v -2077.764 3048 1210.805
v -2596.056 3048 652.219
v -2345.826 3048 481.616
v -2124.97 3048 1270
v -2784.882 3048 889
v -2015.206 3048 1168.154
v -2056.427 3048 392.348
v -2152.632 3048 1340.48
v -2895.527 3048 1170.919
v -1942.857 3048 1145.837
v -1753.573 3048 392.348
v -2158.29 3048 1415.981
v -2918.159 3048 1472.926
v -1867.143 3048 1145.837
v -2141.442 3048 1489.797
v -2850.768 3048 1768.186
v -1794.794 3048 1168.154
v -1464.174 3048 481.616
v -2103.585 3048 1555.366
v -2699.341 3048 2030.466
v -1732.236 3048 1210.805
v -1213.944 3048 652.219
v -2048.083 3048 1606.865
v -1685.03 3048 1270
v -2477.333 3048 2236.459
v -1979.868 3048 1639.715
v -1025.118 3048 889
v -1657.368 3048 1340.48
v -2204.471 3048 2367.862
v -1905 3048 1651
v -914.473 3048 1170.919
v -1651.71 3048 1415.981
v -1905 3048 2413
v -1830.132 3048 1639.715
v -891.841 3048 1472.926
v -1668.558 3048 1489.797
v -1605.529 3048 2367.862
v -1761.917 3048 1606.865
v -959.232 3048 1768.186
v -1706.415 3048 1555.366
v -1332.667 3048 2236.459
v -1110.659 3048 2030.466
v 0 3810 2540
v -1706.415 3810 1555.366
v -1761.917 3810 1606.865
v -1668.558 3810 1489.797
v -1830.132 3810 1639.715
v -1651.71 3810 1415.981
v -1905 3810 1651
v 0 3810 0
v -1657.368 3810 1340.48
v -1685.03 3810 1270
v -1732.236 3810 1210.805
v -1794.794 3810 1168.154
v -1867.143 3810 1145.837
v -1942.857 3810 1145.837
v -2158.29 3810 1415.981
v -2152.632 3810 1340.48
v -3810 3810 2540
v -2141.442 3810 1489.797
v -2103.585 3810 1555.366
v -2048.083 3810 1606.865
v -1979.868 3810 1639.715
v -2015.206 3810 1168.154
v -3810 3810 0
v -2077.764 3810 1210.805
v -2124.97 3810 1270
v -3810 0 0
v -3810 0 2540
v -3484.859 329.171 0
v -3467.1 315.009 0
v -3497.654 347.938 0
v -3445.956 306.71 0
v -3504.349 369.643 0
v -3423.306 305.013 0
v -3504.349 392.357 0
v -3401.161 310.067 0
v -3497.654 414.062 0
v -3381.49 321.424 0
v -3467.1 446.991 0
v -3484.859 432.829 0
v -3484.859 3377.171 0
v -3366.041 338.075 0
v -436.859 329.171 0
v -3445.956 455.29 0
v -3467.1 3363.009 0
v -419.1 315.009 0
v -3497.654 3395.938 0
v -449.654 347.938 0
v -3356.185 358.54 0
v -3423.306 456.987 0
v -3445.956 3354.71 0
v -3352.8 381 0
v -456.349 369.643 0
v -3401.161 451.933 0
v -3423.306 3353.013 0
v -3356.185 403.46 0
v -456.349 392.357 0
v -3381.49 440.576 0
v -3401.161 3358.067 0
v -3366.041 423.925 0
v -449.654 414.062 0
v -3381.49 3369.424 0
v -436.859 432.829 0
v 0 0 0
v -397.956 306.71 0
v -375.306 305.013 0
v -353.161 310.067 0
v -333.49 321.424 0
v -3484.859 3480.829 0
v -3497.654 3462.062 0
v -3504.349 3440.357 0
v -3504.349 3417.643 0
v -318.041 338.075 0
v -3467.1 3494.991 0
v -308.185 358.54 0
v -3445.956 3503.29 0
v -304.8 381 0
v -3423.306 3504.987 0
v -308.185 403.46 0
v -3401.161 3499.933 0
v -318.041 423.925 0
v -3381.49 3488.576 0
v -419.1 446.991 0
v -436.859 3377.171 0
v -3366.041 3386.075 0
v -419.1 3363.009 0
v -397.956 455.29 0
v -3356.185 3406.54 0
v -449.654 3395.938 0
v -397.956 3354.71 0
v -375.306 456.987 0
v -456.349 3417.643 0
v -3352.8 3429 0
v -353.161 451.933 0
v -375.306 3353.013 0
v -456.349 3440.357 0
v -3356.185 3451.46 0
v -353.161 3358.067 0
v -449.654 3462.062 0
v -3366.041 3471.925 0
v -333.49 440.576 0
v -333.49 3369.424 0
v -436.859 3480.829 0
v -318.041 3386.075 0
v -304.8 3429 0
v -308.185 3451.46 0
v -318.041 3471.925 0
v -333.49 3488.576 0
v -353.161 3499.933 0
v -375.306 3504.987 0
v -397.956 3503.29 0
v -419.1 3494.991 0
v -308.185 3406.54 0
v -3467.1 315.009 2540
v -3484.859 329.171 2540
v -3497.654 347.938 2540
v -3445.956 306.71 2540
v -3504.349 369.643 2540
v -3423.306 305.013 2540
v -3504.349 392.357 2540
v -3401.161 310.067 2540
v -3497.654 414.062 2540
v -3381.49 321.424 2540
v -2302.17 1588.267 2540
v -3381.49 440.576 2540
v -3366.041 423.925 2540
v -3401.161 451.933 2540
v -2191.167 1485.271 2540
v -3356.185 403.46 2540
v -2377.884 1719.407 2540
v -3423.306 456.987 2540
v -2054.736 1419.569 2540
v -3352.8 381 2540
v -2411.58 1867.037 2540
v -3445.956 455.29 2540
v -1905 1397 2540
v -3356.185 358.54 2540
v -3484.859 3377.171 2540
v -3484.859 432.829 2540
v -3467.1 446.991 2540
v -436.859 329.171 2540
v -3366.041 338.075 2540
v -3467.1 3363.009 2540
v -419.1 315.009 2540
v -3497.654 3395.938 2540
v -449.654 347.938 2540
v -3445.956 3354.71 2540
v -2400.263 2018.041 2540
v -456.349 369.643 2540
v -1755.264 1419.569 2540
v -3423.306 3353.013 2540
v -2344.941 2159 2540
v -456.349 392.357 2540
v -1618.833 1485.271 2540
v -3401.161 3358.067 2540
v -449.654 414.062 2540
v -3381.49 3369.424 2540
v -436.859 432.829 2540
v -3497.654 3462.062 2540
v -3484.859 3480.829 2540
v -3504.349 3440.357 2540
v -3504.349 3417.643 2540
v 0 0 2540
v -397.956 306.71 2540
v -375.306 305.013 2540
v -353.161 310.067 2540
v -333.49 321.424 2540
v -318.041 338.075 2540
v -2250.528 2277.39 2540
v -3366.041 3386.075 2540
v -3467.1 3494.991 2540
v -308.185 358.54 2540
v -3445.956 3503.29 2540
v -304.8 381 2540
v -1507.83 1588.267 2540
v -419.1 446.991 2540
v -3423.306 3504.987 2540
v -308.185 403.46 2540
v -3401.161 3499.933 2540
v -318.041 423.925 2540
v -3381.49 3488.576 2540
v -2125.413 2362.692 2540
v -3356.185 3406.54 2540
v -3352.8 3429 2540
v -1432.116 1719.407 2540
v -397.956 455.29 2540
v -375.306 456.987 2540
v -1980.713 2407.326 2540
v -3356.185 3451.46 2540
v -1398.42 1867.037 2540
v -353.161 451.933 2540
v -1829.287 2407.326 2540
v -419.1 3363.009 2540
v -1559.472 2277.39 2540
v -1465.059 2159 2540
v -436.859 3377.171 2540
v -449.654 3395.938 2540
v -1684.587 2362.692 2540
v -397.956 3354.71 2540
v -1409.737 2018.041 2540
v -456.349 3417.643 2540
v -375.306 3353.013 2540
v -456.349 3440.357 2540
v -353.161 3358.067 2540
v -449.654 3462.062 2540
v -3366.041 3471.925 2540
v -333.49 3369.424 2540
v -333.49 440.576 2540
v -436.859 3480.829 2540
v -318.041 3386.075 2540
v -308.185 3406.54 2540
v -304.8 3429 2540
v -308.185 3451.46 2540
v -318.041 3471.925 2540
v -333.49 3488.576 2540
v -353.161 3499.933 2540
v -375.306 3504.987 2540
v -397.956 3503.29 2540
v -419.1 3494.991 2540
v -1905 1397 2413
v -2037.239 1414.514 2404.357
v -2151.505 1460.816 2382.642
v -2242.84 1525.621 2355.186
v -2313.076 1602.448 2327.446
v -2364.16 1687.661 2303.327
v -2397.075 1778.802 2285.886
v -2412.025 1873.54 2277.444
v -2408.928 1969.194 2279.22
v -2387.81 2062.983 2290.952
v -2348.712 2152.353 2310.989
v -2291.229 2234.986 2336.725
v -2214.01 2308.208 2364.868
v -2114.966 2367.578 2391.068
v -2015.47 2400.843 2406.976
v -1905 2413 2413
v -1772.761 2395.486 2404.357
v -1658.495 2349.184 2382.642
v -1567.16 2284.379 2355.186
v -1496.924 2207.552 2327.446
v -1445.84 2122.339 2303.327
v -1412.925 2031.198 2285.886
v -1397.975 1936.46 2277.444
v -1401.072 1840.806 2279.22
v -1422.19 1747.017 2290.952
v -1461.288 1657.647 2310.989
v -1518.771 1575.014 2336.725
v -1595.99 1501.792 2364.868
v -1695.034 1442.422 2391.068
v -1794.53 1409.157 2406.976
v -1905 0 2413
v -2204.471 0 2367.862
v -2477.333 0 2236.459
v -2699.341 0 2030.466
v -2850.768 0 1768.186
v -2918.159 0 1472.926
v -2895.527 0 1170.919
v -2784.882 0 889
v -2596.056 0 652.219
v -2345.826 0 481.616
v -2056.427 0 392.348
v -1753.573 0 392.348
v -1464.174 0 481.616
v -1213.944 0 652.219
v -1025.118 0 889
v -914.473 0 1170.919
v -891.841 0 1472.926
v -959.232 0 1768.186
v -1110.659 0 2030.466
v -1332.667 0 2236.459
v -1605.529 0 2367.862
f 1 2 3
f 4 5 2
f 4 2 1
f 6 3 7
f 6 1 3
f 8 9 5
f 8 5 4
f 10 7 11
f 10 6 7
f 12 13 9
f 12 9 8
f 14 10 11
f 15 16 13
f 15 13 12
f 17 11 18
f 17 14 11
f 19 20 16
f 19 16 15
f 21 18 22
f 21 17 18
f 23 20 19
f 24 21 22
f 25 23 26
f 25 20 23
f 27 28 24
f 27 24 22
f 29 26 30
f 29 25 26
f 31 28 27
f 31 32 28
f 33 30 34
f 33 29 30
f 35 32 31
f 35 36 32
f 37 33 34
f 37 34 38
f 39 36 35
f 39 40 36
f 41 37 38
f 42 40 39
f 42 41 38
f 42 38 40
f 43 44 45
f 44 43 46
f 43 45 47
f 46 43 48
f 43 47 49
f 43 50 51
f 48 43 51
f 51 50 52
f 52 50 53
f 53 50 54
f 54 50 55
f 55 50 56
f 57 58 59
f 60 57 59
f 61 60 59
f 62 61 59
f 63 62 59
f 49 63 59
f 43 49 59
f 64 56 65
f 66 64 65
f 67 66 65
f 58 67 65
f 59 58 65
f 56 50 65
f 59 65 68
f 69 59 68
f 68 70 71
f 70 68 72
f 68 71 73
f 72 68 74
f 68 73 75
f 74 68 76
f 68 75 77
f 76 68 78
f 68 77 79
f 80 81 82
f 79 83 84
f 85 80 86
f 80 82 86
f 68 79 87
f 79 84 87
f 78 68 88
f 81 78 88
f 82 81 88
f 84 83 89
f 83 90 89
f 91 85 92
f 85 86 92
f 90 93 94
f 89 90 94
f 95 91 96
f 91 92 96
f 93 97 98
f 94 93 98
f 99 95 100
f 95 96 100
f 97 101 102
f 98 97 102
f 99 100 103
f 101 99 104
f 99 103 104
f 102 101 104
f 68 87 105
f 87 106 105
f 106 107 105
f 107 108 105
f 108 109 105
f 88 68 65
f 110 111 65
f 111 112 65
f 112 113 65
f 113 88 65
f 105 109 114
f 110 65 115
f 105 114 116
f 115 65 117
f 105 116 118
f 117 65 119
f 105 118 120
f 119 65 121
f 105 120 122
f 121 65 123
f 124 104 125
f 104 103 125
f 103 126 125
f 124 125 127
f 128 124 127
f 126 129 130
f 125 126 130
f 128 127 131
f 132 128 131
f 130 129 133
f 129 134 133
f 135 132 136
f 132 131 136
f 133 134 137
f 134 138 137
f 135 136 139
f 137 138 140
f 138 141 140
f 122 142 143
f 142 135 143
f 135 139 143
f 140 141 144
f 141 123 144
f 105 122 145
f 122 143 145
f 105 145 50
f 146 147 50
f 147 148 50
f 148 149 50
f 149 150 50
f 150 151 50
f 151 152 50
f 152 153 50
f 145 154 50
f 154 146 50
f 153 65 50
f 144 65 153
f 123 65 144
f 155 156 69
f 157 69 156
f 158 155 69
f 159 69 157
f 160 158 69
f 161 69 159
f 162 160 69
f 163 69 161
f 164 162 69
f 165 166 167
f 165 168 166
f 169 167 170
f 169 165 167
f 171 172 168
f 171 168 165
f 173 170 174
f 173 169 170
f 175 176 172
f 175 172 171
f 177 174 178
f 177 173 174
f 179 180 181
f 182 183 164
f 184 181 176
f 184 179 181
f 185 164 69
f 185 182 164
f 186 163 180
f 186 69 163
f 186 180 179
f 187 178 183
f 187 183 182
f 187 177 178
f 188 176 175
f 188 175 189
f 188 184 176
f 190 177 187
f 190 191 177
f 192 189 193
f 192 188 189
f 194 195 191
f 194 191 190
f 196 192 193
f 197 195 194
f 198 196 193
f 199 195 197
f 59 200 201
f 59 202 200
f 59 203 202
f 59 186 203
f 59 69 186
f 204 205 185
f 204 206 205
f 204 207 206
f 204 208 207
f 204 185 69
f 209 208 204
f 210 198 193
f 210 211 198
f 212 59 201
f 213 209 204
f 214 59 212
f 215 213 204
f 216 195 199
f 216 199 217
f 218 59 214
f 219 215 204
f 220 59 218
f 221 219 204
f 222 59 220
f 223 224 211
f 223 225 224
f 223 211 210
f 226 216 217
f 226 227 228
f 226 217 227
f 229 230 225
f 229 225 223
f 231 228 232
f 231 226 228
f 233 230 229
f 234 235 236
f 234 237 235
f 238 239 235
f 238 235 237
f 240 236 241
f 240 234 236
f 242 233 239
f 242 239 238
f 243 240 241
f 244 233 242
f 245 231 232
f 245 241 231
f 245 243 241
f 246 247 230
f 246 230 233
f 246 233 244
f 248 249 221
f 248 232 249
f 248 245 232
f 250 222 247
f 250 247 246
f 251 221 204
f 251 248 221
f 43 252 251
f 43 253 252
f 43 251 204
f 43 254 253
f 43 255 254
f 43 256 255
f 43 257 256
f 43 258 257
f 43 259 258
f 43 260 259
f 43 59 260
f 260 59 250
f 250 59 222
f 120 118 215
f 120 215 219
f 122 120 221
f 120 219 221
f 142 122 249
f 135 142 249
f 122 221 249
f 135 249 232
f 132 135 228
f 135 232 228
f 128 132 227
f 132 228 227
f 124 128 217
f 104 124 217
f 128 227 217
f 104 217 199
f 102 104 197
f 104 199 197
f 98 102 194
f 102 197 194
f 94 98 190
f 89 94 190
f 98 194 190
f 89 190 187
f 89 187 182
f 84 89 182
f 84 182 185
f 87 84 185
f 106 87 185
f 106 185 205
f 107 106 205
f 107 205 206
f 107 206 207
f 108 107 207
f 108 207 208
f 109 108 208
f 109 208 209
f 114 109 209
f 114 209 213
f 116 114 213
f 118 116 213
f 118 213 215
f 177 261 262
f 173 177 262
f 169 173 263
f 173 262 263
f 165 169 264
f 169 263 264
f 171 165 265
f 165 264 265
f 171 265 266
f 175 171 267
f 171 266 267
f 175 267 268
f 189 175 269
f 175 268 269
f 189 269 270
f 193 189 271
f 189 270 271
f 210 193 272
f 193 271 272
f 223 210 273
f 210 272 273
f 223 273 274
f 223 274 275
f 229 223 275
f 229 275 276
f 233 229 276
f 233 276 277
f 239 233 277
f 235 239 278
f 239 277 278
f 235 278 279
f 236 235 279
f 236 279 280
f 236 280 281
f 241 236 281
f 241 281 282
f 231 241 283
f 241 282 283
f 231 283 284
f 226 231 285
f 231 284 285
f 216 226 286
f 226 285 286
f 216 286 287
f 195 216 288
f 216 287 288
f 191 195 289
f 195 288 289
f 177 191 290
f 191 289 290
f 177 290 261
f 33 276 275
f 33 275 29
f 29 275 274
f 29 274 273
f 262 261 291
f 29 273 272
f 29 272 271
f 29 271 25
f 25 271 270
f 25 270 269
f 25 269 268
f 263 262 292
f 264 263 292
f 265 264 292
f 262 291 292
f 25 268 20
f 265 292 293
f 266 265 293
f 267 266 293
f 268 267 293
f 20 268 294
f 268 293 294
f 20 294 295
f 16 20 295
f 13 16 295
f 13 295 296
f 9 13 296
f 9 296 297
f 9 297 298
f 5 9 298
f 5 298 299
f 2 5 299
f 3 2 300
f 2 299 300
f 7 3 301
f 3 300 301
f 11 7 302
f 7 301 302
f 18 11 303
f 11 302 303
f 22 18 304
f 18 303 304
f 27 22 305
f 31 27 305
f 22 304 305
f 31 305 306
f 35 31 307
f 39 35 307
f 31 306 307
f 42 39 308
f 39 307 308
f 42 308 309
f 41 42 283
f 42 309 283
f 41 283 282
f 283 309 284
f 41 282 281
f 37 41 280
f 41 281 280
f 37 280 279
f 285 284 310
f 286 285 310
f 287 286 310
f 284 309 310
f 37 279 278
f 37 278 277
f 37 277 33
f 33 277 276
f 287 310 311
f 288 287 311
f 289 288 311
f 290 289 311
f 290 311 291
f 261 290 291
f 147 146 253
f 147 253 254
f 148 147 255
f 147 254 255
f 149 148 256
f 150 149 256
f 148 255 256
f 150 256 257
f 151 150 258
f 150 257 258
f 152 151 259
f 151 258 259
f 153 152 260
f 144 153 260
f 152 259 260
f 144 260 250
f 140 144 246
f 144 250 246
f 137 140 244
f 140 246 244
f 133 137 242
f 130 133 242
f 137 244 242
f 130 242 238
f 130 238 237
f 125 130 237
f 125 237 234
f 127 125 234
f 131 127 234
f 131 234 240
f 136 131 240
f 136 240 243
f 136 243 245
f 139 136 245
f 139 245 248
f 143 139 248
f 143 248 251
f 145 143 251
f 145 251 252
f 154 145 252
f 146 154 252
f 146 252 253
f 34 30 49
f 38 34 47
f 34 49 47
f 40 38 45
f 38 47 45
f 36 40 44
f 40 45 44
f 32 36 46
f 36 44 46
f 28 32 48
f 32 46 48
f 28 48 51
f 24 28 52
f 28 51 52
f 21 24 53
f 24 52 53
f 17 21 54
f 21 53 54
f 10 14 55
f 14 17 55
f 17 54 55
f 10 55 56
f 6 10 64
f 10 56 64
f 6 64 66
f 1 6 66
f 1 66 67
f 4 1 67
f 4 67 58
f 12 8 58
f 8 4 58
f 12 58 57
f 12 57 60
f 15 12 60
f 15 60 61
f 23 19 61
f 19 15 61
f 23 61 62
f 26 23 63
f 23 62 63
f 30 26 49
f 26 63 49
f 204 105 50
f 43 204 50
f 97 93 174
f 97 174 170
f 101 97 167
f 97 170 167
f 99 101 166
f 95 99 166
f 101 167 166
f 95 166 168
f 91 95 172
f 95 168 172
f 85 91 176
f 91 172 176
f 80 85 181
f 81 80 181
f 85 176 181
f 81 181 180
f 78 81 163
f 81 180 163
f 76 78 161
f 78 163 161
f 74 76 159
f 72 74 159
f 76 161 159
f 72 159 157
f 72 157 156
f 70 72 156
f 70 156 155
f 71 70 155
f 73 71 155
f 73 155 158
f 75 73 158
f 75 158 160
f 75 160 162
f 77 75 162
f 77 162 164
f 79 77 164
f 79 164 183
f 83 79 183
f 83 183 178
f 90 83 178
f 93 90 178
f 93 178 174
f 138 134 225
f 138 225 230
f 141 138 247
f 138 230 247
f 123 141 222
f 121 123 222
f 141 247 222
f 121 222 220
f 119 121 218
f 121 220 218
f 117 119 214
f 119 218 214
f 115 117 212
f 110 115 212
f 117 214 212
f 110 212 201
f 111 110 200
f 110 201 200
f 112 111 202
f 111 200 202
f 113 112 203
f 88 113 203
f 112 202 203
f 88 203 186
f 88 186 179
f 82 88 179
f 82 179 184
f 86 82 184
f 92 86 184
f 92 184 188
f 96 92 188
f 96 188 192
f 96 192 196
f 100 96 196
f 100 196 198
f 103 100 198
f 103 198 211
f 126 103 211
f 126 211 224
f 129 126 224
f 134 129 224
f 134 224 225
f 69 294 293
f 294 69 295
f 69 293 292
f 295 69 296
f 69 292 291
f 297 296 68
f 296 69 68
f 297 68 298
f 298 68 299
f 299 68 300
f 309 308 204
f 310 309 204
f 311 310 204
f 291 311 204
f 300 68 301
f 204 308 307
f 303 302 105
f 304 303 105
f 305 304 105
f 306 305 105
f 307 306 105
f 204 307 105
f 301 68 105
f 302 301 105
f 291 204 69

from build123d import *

# Parameters (mm, degrees)
F1_DEPTH  = 2540
F2_W      = 3810
F2_H      = 3810
F2_R      = 508
F3_DEPTH  = 762
F5_DEPTH  = 3048
F7_DEPTH  = 3810.0010001
F8_R      = 254
F9_DEPTH  = 508
F11_DEPTH = 2540.001


with BuildPart() as f1:
    # F0 (on Top) → F1 (new body)
    with BuildSketch(Plane.XY):
        with BuildLine():
            Line((-1905, 0), (0, 0))
            Line((0, 0), (0, 1905))
            Line((0, 1905), (-1397, 1905))
            ThreePointArc((-1397, 1905), (-1545.7897551572, 1545.7897551572), (-1905, 1397))
            Line((-1905, 1397), (-1905, 0))
        make_face()
        with BuildLine():
            Line((-3810, 0), (-1905, 0))
            Line((-1905, 0), (-1905, 1397))
            ThreePointArc((-1905, 1397), (-2264.2102448428, 2264.2102448428), (-1397, 1905))
            Line((-1397, 1905), (0, 1905))
            Line((0, 1905), (0, 3810))
            Line((0, 3810), (-3810, 3810))
            Line((-3810, 3810), (-3810, 0))
        make_face()
    extrude(amount=F1_DEPTH)

    # F2 (on face) → F3 (join)
    with BuildSketch(Plane(origin=(0, 0, 0), x_dir=(1, 0, 0), z_dir=(0, 0, -1))):
        with Locations((-1905, -1905)):
            Rectangle(F2_W, F2_H)
        with Locations((-1905, -1905)):
            Circle(F2_R, mode=Mode.SUBTRACT)
        with Locations((-1905, -1905)):
            Circle(F2_R)
    extrude(amount=-F3_DEPTH)

    # F4 (on face) → F5 (cut)
    with BuildSketch(Plane.XZ):
        with BuildLine():
            ThreePointArc((-889, 1397), (-1186.5795103145, 2115.4204896855), (-1905, 2413))
            ThreePointArc((-1905, 2413), (-2623.4204896855, 678.5795103145), (-889, 1397))
        make_face()
    extrude(amount=-F5_DEPTH, mode=Mode.SUBTRACT)

    # F6 (on face) → F7 (cut, through all)
    with BuildSketch(Plane(origin=(0, 3810, 0), x_dir=(-1, 0, 0), z_dir=(0, 1, 0))):
        with BuildLine():
            ThreePointArc((2159, 1397), (2084.6051224214, 1576.6051224214), (1905, 1651))
            ThreePointArc((1905, 1651), (1725.3948775786, 1217.3948775786), (2159, 1397))
        make_face()
    extrude(amount=-F7_DEPTH, mode=Mode.SUBTRACT)

    # F8 (on face) → F9 (cut)
    with BuildSketch(Plane.XZ.offset(-3048)):
        with Locations((-1905, 1397)):
            Circle(F8_R)
    extrude(amount=-F9_DEPTH, mode=Mode.SUBTRACT)

    # F10 (on face) → F11 (cut, through all)
    with BuildSketch(Plane.XY.offset(2540)):
        with BuildLine():
            ThreePointArc((-3352.8, 3429), (-3375.1184632736, 3482.8815367264), (-3429, 3505.2))
            Line((-3429, 3505.2), (-3429, 3429))
            Line((-3429, 3429), (-3429, 3352.8))
            ThreePointArc((-3429, 3352.8), (-3375.1184632736, 3375.1184632736), (-3352.8, 3429))
        make_face()
        with BuildLine():
            Line((-3429, 3429), (-3429, 3505.2))
            ThreePointArc((-3429, 3505.2), (-3505.2, 3429), (-3429, 3352.8))
            Line((-3429, 3352.8), (-3429, 3429))
        make_face()
        with BuildLine():
            ThreePointArc((-457.2, 3429), (-381, 3352.8), (-304.8, 3429))
            ThreePointArc((-304.8, 3429), (-381, 3505.2), (-457.2, 3429))
        make_face()
        with BuildLine():
            ThreePointArc((-457.2, 381), (-381, 304.8), (-304.8, 381))
            ThreePointArc((-304.8, 381), (-381, 457.2), (-457.2, 381))
        make_face()
        with BuildLine():
            ThreePointArc((-3429, 457.2), (-3482.8815367264, 327.1184632736), (-3352.8, 381))
            ThreePointArc((-3352.8, 381), (-3375.1184632736, 434.8815367264), (-3429, 457.2))
        make_face()
    extrude(amount=-F11_DEPTH, mode=Mode.SUBTRACT)


solid = f1.part
